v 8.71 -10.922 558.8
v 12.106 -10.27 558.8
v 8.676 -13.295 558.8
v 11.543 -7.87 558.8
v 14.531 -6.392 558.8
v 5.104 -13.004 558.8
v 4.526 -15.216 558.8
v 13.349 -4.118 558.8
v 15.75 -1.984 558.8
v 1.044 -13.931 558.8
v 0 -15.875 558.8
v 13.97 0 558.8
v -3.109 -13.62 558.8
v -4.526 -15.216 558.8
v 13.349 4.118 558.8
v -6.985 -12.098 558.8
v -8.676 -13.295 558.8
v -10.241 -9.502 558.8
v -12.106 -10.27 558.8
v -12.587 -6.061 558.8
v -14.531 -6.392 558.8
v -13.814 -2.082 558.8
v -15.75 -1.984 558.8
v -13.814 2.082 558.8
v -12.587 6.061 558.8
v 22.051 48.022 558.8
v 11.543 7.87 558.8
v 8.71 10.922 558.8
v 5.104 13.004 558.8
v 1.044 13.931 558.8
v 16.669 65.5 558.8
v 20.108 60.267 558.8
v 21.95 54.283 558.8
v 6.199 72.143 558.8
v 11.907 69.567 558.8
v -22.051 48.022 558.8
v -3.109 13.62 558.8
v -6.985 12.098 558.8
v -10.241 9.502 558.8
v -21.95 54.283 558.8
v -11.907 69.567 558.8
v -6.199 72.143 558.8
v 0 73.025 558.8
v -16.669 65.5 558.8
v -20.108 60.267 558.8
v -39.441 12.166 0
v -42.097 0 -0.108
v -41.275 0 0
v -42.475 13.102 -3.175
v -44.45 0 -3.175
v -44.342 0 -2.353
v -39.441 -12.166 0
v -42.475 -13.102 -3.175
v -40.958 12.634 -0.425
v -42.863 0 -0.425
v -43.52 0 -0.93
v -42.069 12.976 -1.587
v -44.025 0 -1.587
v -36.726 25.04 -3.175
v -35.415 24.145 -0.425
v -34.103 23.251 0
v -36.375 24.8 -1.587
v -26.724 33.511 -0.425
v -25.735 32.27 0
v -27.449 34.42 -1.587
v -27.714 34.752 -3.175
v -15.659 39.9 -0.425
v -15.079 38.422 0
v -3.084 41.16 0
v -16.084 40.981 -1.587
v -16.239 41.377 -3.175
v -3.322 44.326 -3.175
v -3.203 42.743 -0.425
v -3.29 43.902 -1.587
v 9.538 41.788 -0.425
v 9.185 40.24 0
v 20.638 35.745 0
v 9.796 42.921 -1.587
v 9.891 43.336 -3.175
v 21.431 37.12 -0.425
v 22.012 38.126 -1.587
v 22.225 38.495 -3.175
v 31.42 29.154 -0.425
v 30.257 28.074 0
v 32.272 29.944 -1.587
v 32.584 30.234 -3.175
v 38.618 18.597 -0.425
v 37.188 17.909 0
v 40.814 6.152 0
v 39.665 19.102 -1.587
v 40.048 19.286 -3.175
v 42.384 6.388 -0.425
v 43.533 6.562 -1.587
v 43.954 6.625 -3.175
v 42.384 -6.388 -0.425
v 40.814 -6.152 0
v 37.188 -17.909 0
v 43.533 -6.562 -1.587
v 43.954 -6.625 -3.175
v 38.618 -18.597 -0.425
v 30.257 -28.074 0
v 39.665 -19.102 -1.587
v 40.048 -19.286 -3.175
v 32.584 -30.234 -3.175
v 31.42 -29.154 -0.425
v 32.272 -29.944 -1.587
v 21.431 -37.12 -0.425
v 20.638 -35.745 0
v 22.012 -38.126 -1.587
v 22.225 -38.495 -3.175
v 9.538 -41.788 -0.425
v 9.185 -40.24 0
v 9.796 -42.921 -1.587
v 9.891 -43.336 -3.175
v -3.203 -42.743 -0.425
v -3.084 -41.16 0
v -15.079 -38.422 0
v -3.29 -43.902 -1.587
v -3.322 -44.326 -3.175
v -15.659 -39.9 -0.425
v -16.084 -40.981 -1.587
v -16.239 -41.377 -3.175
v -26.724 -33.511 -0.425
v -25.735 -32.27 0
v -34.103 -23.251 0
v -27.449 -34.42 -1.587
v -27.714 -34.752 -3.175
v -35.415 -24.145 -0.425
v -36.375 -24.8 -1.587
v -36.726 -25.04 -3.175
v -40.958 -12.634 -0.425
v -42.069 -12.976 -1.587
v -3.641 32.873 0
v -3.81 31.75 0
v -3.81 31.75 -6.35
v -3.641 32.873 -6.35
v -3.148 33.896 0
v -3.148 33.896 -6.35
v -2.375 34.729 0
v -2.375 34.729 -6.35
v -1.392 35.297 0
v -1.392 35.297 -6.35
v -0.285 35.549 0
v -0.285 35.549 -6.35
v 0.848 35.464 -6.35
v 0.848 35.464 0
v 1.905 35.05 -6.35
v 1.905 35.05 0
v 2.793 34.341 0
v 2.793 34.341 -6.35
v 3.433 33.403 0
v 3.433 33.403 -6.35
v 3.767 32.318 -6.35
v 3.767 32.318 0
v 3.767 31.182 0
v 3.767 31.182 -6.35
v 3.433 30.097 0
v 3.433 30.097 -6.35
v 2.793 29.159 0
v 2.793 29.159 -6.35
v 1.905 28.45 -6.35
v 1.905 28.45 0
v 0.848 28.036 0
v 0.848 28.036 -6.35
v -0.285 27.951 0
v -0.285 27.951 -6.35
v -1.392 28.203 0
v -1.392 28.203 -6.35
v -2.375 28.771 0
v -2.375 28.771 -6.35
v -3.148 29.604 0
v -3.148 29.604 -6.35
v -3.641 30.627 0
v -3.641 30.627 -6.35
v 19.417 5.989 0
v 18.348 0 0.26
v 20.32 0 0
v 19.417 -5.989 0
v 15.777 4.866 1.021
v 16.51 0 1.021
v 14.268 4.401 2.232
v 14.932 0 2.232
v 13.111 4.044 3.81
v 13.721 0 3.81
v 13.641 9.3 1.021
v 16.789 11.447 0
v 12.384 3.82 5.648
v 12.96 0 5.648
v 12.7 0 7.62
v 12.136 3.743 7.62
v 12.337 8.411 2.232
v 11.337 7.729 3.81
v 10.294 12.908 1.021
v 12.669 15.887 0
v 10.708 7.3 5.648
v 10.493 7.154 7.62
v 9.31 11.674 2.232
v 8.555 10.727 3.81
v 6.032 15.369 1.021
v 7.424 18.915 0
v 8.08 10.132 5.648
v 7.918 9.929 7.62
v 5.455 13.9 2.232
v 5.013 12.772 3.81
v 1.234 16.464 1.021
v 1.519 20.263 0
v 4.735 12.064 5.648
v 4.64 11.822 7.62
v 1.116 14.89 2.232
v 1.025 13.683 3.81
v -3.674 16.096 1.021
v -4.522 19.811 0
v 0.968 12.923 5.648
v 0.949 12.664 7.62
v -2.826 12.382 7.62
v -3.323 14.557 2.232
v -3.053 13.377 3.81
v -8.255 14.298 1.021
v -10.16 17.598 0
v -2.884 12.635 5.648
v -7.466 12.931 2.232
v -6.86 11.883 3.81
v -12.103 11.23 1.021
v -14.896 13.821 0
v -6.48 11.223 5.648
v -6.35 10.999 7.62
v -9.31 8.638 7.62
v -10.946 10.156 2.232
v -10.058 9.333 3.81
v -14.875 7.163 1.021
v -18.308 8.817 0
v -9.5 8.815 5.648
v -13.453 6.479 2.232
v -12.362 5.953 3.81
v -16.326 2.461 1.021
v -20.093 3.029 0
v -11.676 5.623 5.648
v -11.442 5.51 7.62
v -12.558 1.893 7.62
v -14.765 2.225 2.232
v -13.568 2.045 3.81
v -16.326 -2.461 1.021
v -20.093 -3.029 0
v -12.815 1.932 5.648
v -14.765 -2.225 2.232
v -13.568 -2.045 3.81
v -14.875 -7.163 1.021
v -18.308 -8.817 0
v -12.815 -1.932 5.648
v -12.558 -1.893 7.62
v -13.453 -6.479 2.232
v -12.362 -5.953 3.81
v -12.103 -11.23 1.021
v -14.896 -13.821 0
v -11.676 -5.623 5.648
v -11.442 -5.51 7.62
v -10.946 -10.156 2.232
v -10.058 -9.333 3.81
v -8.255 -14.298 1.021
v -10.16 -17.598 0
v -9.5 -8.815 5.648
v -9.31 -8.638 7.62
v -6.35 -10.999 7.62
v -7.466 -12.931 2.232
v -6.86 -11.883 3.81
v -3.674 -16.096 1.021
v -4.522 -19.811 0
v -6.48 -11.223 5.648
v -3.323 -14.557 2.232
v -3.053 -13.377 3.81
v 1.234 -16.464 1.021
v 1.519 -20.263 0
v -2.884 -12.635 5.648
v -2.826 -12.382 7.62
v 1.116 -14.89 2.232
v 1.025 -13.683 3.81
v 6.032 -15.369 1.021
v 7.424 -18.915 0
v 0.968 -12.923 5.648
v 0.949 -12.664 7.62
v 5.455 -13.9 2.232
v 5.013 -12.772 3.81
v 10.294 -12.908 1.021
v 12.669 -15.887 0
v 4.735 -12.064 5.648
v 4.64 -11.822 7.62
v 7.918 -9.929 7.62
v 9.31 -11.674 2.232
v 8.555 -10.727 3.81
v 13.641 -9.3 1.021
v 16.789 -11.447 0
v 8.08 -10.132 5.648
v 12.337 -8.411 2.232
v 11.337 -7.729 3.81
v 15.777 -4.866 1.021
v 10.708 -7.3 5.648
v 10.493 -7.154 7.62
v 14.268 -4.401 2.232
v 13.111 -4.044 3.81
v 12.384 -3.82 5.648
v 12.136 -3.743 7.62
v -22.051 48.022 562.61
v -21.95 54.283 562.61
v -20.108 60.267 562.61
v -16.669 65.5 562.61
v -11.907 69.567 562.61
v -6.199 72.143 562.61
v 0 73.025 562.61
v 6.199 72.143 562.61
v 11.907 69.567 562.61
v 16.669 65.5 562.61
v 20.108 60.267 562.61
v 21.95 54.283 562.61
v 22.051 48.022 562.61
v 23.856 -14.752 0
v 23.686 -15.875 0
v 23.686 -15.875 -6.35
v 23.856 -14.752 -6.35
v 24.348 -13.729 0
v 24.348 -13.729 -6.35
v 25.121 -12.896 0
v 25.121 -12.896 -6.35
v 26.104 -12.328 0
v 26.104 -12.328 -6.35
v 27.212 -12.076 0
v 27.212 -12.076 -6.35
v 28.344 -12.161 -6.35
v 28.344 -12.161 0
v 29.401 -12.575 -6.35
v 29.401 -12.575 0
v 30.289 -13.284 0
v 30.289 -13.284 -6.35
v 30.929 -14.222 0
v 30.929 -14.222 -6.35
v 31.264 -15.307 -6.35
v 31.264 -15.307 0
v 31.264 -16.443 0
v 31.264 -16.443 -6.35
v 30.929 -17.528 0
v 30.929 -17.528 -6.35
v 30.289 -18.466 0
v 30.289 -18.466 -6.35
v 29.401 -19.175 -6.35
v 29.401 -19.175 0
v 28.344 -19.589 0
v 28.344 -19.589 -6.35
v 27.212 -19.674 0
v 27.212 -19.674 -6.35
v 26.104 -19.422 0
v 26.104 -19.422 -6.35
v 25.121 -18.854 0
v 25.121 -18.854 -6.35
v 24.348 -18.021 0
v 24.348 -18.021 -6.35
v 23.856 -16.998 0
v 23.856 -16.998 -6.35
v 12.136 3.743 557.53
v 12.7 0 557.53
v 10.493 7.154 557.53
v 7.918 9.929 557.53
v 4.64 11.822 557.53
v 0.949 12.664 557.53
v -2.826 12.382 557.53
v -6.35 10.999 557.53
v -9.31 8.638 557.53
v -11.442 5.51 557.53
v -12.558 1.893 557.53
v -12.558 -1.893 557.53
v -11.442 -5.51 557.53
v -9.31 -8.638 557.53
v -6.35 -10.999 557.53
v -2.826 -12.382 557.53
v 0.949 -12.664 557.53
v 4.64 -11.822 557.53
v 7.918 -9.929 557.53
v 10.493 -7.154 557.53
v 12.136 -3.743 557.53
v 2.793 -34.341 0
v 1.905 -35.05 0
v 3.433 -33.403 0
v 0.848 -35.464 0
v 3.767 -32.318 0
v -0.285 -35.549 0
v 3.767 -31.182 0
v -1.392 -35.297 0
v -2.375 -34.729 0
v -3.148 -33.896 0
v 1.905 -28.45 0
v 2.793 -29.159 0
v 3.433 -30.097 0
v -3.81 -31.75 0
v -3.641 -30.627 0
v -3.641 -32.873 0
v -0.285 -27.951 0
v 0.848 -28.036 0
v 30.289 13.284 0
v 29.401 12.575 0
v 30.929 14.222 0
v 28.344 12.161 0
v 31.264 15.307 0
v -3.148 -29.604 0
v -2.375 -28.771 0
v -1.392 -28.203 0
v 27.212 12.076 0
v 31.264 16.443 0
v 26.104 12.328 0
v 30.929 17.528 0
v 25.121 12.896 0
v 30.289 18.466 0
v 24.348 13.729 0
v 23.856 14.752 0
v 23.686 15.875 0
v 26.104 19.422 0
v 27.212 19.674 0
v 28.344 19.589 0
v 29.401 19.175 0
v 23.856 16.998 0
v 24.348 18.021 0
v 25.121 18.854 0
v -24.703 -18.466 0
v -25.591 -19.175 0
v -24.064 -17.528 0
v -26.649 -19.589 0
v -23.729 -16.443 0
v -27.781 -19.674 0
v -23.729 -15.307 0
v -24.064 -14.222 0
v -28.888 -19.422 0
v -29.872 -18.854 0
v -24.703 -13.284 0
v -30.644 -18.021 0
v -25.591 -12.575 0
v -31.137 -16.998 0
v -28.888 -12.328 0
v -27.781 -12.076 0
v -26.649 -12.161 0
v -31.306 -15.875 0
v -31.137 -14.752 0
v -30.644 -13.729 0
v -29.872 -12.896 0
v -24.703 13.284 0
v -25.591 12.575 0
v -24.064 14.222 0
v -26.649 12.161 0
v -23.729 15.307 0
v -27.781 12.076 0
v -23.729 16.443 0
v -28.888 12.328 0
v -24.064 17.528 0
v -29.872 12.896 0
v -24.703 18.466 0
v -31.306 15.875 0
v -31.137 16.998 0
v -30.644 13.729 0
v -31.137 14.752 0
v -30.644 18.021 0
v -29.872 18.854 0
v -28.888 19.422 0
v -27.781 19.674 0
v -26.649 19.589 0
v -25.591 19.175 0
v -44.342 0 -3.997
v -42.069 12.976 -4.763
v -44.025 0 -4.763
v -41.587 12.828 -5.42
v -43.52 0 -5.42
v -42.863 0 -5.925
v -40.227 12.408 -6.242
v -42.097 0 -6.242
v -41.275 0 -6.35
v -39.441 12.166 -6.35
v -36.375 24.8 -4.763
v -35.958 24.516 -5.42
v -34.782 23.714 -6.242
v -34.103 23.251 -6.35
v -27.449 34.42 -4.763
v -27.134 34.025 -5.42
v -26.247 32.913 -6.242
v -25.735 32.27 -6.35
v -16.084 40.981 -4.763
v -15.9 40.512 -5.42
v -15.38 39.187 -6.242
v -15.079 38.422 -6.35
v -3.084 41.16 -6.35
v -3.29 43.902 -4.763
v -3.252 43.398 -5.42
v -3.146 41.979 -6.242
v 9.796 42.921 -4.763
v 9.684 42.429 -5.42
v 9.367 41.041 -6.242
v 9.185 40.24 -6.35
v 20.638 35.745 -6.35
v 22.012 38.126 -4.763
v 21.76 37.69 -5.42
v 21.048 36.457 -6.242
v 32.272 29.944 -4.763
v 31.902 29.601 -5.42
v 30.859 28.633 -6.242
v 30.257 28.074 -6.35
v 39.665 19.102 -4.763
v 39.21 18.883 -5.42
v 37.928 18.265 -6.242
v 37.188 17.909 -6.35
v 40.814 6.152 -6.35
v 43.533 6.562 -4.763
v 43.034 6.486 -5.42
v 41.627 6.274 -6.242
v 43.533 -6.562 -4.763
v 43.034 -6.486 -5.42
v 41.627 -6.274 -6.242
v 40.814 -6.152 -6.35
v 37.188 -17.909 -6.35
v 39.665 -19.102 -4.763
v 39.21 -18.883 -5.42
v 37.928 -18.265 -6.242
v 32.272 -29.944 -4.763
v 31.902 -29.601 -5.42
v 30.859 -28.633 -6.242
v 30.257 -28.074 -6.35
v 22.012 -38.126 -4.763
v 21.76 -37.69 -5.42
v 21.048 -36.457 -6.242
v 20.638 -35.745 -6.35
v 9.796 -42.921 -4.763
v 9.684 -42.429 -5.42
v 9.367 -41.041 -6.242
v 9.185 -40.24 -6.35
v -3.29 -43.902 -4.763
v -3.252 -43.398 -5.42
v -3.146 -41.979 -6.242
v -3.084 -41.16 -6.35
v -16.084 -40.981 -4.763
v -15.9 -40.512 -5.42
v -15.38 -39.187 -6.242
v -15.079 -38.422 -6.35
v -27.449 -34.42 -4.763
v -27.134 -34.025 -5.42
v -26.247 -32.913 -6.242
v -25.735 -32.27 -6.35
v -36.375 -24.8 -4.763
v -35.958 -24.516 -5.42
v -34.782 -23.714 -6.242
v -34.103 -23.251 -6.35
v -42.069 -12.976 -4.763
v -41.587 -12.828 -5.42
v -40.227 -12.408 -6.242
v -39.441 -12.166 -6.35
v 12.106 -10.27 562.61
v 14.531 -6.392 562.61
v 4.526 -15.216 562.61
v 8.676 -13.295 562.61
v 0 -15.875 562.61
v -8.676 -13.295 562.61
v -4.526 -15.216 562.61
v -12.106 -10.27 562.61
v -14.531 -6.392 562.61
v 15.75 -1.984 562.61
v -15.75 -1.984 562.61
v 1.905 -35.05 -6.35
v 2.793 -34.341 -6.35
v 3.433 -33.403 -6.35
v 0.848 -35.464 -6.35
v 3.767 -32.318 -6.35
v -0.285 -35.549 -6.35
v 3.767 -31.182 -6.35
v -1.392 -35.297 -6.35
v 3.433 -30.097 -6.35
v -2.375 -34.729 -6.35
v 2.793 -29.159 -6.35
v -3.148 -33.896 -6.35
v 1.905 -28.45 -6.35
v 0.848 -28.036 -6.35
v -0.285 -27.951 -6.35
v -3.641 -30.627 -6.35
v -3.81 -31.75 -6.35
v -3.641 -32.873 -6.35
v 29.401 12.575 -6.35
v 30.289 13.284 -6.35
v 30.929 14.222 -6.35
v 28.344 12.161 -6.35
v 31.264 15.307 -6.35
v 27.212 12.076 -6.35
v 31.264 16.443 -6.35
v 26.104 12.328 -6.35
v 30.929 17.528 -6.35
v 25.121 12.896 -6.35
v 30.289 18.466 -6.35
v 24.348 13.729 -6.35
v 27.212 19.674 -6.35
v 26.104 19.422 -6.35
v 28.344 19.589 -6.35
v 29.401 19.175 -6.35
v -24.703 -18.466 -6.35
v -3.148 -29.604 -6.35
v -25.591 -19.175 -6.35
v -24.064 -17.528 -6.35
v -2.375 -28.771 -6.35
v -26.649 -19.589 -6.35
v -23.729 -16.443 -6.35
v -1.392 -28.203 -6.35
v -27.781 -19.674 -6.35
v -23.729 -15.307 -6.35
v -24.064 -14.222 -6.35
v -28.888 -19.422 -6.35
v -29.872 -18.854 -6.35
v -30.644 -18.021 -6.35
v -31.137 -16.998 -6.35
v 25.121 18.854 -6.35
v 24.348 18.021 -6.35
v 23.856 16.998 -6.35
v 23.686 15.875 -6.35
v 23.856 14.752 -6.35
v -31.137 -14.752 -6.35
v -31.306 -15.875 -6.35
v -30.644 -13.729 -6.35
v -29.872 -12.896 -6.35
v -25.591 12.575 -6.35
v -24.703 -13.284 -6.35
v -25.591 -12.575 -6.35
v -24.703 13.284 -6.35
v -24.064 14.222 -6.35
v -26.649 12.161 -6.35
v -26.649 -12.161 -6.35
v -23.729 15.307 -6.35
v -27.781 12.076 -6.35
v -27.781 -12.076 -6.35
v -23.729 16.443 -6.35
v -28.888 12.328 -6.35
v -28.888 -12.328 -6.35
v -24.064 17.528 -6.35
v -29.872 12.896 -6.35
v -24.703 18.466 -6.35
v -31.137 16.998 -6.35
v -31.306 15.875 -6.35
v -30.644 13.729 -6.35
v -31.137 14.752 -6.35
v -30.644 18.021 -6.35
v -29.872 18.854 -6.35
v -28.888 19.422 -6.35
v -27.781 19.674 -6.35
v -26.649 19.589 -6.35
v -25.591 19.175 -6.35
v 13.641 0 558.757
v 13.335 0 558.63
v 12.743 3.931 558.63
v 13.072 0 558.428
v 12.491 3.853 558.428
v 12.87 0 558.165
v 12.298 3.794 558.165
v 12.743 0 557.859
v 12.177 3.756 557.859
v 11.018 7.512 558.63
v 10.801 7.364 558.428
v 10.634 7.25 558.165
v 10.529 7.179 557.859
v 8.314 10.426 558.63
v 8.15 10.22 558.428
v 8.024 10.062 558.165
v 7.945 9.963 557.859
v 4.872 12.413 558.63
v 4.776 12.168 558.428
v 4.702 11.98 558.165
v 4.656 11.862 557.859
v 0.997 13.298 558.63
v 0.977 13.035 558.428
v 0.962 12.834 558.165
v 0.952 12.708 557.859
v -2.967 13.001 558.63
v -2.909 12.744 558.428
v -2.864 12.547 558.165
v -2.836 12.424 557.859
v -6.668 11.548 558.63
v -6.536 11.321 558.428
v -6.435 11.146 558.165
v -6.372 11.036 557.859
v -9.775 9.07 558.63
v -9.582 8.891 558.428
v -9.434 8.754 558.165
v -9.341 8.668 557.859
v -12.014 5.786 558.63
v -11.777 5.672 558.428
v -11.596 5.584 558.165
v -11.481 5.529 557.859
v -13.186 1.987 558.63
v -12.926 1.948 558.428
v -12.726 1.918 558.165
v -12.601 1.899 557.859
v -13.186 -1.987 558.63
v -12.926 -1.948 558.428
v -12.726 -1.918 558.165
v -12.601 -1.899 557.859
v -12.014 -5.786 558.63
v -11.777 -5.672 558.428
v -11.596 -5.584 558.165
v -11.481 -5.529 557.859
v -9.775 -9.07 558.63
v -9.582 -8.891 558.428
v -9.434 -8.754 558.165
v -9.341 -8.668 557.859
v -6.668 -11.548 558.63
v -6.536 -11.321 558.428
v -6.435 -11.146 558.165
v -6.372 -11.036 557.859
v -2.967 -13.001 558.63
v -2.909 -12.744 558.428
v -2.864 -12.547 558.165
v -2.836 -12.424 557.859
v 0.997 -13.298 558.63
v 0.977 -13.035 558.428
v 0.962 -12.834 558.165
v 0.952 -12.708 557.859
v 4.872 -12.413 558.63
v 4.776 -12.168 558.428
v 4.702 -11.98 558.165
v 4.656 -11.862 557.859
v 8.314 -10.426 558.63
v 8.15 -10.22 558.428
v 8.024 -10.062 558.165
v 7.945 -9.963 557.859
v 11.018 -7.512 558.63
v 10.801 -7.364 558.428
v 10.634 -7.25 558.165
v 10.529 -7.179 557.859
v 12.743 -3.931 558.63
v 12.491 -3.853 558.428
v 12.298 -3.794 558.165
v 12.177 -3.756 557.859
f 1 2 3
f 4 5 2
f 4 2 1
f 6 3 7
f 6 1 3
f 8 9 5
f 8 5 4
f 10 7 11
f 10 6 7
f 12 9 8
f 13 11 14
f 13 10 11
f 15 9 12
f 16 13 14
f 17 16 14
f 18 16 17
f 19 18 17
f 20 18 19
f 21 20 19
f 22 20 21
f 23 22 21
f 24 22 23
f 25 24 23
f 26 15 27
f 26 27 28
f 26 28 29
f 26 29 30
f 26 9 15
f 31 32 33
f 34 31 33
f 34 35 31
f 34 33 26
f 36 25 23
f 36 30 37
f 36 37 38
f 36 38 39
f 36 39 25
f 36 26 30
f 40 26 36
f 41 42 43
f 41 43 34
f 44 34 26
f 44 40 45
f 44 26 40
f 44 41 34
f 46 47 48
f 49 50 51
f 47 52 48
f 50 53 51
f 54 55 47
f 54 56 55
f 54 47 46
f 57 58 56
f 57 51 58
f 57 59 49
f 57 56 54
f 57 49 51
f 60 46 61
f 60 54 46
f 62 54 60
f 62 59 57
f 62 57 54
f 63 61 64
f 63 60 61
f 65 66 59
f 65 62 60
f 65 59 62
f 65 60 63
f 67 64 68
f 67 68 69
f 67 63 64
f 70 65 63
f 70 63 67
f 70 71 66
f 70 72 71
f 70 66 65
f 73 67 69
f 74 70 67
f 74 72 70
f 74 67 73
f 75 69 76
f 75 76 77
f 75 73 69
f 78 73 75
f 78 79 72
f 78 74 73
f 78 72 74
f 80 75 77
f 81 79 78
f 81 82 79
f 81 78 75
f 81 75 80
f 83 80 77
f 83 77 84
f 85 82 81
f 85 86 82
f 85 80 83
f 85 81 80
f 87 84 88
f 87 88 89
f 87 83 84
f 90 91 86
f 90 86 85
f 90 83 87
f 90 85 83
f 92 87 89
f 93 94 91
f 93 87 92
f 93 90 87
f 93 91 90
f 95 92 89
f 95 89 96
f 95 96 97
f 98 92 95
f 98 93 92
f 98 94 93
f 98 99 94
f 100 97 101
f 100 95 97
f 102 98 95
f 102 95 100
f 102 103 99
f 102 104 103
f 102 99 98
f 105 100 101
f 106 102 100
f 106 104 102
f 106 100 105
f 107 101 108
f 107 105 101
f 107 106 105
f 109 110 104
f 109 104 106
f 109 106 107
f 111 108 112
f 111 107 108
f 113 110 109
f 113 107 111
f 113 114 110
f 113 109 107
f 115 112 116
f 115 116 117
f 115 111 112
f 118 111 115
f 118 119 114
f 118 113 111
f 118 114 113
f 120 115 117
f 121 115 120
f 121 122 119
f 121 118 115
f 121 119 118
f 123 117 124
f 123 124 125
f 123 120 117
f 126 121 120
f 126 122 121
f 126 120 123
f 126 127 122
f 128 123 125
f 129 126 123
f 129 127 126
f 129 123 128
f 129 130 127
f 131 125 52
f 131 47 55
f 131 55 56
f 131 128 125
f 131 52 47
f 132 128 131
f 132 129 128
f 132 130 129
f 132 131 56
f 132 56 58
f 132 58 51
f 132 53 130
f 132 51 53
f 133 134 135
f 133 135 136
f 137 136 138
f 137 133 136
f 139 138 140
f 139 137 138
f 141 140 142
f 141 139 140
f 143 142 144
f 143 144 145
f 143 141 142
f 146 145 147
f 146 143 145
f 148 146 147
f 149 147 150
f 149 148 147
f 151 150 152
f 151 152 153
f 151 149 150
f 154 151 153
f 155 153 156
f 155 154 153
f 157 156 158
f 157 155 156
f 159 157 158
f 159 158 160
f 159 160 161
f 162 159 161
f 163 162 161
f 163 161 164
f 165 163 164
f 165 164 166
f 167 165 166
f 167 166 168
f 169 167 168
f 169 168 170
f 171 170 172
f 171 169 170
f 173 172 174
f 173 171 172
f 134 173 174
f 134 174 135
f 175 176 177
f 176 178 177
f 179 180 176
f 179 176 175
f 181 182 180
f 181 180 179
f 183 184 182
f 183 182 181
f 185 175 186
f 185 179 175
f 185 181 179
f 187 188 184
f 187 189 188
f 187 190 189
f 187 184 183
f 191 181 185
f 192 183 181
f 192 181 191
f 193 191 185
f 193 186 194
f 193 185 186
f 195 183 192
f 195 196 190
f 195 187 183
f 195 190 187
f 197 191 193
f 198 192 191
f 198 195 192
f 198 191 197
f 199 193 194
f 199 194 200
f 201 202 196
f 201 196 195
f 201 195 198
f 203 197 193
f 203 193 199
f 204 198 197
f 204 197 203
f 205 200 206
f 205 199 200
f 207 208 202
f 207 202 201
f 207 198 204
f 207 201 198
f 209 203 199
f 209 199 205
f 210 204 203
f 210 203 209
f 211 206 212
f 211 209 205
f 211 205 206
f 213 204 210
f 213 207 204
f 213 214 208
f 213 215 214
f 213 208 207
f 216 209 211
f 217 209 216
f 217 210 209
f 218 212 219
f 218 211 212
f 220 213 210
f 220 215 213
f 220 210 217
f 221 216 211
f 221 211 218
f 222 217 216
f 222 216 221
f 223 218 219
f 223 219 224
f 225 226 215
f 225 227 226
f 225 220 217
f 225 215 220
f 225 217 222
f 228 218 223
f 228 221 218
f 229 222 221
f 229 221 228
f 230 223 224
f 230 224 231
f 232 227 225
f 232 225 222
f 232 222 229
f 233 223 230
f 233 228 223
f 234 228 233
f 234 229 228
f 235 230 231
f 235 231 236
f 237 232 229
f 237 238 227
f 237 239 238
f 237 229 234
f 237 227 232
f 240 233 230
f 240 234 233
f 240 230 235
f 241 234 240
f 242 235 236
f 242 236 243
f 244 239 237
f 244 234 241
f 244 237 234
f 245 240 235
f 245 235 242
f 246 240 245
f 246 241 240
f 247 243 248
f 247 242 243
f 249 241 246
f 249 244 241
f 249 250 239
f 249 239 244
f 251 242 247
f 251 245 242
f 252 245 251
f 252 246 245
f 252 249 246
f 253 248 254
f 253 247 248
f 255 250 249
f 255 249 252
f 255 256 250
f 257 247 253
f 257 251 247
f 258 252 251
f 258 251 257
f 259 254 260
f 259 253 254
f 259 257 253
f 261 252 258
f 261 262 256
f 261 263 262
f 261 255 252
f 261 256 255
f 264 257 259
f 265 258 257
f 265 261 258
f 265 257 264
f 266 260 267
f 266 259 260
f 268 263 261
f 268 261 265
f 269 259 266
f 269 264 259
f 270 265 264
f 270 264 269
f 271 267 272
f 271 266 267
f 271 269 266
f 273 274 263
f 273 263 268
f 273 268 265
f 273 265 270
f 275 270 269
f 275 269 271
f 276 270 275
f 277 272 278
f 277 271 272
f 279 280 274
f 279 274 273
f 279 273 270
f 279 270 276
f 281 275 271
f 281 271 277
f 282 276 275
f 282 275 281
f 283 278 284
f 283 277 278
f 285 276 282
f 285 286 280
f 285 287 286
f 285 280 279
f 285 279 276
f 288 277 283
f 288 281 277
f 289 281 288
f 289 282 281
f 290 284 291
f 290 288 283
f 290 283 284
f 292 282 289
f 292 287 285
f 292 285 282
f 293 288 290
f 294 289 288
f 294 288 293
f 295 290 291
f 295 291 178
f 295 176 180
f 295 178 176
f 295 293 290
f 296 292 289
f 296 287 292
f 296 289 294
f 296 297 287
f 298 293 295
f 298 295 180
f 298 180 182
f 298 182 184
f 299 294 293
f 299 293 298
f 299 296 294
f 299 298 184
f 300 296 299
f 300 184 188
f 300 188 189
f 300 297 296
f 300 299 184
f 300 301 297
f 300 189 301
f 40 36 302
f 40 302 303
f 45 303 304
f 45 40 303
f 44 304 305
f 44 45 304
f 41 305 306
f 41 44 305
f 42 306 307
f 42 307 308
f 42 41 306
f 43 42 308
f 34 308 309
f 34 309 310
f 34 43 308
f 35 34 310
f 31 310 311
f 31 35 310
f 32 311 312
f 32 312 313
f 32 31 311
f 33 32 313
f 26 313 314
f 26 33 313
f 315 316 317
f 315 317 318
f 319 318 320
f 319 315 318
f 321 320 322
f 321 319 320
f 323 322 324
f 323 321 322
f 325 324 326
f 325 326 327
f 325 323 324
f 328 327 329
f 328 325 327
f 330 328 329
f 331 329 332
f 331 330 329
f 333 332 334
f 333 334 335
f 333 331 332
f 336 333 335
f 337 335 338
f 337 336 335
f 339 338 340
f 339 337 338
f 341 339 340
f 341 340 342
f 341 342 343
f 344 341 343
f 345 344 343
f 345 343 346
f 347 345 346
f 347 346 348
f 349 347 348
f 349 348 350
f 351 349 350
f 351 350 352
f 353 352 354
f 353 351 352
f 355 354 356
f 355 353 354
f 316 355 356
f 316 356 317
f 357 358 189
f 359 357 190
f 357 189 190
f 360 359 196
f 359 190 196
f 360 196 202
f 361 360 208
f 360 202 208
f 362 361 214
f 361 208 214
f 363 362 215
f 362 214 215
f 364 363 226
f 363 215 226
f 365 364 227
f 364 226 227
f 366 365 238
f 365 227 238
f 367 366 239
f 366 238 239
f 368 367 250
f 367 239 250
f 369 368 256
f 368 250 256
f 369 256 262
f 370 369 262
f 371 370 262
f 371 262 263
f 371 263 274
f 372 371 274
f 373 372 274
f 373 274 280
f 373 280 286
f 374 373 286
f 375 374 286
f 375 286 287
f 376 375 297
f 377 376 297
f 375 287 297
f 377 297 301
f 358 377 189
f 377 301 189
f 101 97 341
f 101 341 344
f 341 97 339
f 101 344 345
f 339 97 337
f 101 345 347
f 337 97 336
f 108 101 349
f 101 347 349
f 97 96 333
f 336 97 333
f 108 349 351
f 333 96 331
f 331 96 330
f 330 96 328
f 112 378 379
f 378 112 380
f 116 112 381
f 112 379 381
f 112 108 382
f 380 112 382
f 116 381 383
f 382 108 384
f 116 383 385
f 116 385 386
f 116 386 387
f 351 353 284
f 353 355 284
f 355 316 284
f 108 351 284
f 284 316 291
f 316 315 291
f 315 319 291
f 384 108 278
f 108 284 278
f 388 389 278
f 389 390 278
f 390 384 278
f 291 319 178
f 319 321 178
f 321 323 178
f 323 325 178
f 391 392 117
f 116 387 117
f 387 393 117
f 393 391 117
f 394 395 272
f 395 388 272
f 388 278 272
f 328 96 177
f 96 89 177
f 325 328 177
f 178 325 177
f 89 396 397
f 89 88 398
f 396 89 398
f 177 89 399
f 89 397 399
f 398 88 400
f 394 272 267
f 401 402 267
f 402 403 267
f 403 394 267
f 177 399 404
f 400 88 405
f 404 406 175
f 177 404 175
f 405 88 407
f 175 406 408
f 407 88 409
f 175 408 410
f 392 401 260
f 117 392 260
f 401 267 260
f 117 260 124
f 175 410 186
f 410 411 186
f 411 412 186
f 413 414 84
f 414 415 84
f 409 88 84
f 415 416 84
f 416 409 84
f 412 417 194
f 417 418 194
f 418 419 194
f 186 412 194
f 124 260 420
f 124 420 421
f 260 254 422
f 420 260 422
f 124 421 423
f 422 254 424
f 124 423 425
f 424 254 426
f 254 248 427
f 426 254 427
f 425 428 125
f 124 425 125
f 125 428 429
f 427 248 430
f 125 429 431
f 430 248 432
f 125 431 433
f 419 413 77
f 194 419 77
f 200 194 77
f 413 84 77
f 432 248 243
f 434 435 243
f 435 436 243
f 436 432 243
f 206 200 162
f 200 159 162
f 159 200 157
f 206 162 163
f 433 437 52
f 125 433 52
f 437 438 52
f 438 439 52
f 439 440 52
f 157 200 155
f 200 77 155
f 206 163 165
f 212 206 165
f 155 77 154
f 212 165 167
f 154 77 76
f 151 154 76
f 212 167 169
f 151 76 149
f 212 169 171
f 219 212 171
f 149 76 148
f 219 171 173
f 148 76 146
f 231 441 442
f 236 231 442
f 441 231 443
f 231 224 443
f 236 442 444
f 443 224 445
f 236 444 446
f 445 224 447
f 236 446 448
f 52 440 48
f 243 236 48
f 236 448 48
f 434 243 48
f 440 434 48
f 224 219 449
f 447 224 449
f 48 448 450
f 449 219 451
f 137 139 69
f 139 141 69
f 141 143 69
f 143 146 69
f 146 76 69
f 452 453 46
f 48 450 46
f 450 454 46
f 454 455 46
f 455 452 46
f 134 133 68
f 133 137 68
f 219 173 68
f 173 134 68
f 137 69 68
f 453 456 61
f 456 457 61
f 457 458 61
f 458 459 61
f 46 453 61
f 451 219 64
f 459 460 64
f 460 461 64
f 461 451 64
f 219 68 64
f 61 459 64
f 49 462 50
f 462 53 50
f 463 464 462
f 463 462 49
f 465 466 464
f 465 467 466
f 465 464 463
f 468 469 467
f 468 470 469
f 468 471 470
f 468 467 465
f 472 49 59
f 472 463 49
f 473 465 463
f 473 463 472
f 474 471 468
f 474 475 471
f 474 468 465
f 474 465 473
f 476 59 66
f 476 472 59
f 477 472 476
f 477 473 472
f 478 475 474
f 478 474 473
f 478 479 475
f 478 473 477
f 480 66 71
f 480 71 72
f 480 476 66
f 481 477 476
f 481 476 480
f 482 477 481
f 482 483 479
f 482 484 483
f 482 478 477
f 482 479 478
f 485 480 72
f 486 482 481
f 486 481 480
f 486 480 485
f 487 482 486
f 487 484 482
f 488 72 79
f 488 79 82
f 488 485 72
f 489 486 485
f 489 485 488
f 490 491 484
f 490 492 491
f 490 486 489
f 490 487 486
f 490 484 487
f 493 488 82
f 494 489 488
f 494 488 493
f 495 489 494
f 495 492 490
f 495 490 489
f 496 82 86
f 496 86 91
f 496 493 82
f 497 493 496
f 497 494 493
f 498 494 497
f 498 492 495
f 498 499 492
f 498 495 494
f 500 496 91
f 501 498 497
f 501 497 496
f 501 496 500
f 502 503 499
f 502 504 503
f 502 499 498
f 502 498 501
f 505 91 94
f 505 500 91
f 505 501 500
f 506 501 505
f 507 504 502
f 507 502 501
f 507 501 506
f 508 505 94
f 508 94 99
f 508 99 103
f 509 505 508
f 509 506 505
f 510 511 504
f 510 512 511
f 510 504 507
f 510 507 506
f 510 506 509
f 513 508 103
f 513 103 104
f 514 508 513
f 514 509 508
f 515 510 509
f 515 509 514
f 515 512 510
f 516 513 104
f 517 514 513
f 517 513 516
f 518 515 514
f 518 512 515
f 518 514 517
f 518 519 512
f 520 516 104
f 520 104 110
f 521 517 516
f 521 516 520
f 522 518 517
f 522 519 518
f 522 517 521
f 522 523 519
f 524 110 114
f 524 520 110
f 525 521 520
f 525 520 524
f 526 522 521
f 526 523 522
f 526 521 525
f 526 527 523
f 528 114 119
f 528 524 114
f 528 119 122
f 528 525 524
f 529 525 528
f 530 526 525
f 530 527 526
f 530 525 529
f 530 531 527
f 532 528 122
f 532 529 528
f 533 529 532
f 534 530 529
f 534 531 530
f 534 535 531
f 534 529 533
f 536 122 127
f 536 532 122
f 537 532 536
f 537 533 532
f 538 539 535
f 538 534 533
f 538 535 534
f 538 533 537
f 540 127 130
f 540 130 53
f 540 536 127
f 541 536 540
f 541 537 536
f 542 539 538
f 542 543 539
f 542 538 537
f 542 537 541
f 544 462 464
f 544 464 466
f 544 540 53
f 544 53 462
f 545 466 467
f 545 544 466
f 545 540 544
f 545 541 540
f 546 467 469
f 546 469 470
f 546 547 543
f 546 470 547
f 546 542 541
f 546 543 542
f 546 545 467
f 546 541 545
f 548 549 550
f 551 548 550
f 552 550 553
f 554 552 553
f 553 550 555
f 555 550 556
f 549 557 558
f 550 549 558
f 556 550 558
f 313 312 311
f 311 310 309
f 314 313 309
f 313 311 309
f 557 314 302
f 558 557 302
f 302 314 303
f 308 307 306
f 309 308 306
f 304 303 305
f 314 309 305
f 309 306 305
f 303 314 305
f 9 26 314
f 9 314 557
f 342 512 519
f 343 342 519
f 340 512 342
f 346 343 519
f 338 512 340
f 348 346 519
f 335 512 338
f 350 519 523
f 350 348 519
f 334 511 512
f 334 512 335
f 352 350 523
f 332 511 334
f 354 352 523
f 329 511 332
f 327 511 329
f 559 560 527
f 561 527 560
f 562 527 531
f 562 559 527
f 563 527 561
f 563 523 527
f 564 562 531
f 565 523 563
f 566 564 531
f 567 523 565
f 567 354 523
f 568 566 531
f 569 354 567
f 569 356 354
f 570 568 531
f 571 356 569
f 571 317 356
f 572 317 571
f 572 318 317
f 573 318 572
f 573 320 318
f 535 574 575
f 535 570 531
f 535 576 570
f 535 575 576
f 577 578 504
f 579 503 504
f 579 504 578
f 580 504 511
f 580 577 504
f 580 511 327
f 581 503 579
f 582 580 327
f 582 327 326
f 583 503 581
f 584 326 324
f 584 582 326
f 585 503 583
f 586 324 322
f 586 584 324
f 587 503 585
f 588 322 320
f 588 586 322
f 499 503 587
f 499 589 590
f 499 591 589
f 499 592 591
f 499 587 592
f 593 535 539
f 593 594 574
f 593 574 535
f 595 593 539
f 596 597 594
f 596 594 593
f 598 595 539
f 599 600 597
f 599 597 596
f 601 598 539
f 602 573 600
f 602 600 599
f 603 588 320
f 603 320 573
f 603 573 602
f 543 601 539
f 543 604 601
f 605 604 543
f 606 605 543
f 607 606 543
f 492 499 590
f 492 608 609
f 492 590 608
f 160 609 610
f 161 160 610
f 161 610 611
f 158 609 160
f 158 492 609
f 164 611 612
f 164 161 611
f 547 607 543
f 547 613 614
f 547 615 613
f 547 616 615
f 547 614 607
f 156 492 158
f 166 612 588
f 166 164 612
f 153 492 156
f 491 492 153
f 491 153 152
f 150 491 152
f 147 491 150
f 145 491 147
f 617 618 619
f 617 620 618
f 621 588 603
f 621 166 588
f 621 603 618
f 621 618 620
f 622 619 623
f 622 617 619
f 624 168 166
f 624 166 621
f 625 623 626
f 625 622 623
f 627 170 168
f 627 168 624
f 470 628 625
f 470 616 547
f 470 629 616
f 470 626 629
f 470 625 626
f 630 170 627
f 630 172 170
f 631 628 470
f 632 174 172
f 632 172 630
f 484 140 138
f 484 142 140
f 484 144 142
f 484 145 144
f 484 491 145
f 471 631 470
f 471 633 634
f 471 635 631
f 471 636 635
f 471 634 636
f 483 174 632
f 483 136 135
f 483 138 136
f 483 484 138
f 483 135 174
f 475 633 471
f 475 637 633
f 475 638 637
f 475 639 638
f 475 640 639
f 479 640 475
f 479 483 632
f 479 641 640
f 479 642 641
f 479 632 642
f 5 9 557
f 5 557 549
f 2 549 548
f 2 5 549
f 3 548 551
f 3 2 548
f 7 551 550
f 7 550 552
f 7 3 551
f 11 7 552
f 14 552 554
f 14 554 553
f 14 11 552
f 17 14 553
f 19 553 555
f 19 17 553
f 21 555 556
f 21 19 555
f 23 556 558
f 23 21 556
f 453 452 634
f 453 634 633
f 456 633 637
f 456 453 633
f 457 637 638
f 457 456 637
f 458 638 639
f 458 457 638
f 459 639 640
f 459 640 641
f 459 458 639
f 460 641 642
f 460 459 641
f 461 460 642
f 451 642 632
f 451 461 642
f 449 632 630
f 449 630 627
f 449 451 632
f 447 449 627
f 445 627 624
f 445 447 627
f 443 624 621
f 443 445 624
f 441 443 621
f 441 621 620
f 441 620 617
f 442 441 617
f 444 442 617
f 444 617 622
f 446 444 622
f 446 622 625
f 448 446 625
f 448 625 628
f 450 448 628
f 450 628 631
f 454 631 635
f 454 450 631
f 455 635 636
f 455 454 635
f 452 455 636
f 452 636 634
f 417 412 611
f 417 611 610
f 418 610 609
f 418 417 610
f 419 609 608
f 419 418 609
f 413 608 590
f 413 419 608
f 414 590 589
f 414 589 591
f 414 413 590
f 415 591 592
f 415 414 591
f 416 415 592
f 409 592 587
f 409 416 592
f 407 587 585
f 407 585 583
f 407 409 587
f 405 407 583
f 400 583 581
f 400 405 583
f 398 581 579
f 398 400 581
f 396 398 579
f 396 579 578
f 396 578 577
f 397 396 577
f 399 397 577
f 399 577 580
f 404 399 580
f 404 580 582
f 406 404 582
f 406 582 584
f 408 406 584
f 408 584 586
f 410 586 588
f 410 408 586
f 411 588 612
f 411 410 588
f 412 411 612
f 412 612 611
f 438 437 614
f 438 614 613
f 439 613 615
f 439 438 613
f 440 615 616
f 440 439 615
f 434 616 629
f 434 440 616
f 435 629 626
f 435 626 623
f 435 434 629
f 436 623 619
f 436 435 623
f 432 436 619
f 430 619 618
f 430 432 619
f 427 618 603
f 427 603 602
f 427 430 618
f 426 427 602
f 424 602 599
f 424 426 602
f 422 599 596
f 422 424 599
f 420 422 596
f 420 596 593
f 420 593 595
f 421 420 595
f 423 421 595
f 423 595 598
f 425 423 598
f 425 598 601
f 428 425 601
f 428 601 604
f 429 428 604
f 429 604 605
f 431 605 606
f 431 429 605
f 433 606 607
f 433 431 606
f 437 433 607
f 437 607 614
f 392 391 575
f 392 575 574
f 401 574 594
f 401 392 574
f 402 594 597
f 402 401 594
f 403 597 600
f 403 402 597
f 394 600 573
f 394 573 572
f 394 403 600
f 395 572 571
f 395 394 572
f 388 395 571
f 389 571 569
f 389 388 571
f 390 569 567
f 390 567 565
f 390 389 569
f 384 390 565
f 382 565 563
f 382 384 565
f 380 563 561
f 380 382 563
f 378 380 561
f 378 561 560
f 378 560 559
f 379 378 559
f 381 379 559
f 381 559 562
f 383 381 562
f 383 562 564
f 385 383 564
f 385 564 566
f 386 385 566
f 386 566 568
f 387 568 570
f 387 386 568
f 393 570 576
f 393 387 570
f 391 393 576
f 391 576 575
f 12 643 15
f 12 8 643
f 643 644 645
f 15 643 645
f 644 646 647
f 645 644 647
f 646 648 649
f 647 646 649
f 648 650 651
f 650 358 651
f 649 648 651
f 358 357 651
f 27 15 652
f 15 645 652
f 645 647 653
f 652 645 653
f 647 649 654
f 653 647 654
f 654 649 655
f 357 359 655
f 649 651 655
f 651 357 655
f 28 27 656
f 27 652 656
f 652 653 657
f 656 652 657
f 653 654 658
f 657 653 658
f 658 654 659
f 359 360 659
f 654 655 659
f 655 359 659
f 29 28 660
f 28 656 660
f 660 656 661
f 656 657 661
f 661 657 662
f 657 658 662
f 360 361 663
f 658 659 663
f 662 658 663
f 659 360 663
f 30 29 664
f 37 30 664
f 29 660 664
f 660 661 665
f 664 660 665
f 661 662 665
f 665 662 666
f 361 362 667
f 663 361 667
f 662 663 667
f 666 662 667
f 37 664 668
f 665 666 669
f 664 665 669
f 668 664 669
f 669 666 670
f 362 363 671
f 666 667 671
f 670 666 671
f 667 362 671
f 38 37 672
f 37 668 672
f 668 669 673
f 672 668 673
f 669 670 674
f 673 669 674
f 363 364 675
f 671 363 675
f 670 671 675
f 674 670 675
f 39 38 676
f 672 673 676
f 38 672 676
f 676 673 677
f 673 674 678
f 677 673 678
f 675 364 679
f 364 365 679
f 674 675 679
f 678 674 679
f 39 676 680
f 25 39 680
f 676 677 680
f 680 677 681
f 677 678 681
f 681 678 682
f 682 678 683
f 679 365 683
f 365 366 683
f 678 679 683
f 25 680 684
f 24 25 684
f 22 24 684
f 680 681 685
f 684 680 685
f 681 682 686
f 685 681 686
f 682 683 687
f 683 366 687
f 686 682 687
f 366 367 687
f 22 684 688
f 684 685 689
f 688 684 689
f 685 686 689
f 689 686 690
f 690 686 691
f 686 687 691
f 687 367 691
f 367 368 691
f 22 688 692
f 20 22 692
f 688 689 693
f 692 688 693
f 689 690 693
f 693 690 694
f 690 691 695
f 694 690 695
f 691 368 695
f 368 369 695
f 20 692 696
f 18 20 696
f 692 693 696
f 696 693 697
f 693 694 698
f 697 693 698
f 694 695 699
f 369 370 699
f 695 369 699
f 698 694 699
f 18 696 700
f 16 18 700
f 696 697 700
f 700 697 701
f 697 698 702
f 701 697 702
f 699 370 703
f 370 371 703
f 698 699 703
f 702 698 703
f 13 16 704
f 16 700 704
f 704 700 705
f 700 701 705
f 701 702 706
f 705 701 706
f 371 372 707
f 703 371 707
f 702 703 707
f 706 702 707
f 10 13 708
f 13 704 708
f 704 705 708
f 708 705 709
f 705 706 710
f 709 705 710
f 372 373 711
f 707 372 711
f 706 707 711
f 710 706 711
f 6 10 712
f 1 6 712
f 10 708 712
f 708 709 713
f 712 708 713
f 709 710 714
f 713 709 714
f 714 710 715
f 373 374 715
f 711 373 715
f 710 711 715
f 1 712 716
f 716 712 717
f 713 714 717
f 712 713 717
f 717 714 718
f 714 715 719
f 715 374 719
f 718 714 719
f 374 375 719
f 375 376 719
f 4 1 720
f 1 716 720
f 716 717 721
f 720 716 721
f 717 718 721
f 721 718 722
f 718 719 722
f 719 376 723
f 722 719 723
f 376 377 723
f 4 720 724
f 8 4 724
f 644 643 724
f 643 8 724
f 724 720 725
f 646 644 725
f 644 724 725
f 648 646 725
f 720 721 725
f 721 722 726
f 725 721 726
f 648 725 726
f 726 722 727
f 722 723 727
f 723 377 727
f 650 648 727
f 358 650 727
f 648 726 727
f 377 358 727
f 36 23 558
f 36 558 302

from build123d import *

# Parameters (mm, degrees)
SKETCH2_R           = 12.7
BOSS_EXTRUDE1_DEPTH = 558.8
SKETCH3_R           = 44.45
SKETCH3_R_2         = 3.81
BOSS_EXTRUDE2_DEPTH = 6.35
FILLET1_R           = 7.62
FILLET2_R           = 3.175
BOSS_EXTRUDE3_DEPTH = 3.81
FILLET3_R           = 1.27


with BuildPart() as part:
    # Sketch2 → Boss-Extrude1 (new body)
    with BuildSketch(Plane.XY):
        Circle(SKETCH2_R)
    extrude(amount=BOSS_EXTRUDE1_DEPTH)

    # Sketch3 → Boss-Extrude2 (add)
    with BuildSketch(Plane(origin=(0, 0, 0), x_dir=(-1, 0, 0), z_dir=(0, 0, -1))):
        Circle(SKETCH3_R)
        with Locations((0, 31.75)):
            Circle(SKETCH3_R_2, mode=Mode.SUBTRACT)
        with Locations((27.49630657, 15.875)):
            Circle(SKETCH3_R_2, mode=Mode.SUBTRACT)
        with Locations((27.49630657, -15.875)):
            Circle(SKETCH3_R_2, mode=Mode.SUBTRACT)
        with Locations((0, -31.75)):
            Circle(SKETCH3_R_2, mode=Mode.SUBTRACT)
        with Locations((-27.49630657, -15.875)):
            Circle(SKETCH3_R_2, mode=Mode.SUBTRACT)
        with Locations((-27.49630657, 15.875)):
            Circle(SKETCH3_R_2, mode=Mode.SUBTRACT)
    extrude(amount=BOSS_EXTRUDE2_DEPTH)

    # Fillet1
    fillet1_edges = [part.edges().sort_by_distance(p)[0] for p in [
        (-12.7, 0, 0),
    ]]
    fillet(fillet1_edges, radius=FILLET1_R)

    # Fillet2
    fillet2_edges = [part.edges().sort_by_distance(p)[0] for p in [
        (44.45, 0, -6.35),
        (44.45, 0, 0),
    ]]
    fillet(fillet2_edges, radius=FILLET2_R - 0.0001)  # a hair under: the kernel refuses the full size

    # Sketch4 → Boss-Extrude3 (add)
    with BuildSketch(Plane.XY.offset(558.8)):
        with BuildLine():
            Line((-15.750488274, -1.984375), (-22.050683583, 48.021875))
            ThreePointArc((-22.050683583, 48.021875), (0, 73.025), (22.050683583, 48.021875))
            Line((22.050683583, 48.021875), (15.750488274, -1.984375))
            ThreePointArc((15.750488274, -1.984375), (0, -15.875), (-15.750488274, -1.984375))
        make_face()
    extrude(amount=BOSS_EXTRUDE3_DEPTH)

    # Fillet3
    fillet3_edges = [part.edges().sort_by_distance(p)[0] for p in [
        (-12.7, 0, 558.8),
    ]]
    fillet(fillet3_edges, radius=FILLET3_R)


solid = part.part
